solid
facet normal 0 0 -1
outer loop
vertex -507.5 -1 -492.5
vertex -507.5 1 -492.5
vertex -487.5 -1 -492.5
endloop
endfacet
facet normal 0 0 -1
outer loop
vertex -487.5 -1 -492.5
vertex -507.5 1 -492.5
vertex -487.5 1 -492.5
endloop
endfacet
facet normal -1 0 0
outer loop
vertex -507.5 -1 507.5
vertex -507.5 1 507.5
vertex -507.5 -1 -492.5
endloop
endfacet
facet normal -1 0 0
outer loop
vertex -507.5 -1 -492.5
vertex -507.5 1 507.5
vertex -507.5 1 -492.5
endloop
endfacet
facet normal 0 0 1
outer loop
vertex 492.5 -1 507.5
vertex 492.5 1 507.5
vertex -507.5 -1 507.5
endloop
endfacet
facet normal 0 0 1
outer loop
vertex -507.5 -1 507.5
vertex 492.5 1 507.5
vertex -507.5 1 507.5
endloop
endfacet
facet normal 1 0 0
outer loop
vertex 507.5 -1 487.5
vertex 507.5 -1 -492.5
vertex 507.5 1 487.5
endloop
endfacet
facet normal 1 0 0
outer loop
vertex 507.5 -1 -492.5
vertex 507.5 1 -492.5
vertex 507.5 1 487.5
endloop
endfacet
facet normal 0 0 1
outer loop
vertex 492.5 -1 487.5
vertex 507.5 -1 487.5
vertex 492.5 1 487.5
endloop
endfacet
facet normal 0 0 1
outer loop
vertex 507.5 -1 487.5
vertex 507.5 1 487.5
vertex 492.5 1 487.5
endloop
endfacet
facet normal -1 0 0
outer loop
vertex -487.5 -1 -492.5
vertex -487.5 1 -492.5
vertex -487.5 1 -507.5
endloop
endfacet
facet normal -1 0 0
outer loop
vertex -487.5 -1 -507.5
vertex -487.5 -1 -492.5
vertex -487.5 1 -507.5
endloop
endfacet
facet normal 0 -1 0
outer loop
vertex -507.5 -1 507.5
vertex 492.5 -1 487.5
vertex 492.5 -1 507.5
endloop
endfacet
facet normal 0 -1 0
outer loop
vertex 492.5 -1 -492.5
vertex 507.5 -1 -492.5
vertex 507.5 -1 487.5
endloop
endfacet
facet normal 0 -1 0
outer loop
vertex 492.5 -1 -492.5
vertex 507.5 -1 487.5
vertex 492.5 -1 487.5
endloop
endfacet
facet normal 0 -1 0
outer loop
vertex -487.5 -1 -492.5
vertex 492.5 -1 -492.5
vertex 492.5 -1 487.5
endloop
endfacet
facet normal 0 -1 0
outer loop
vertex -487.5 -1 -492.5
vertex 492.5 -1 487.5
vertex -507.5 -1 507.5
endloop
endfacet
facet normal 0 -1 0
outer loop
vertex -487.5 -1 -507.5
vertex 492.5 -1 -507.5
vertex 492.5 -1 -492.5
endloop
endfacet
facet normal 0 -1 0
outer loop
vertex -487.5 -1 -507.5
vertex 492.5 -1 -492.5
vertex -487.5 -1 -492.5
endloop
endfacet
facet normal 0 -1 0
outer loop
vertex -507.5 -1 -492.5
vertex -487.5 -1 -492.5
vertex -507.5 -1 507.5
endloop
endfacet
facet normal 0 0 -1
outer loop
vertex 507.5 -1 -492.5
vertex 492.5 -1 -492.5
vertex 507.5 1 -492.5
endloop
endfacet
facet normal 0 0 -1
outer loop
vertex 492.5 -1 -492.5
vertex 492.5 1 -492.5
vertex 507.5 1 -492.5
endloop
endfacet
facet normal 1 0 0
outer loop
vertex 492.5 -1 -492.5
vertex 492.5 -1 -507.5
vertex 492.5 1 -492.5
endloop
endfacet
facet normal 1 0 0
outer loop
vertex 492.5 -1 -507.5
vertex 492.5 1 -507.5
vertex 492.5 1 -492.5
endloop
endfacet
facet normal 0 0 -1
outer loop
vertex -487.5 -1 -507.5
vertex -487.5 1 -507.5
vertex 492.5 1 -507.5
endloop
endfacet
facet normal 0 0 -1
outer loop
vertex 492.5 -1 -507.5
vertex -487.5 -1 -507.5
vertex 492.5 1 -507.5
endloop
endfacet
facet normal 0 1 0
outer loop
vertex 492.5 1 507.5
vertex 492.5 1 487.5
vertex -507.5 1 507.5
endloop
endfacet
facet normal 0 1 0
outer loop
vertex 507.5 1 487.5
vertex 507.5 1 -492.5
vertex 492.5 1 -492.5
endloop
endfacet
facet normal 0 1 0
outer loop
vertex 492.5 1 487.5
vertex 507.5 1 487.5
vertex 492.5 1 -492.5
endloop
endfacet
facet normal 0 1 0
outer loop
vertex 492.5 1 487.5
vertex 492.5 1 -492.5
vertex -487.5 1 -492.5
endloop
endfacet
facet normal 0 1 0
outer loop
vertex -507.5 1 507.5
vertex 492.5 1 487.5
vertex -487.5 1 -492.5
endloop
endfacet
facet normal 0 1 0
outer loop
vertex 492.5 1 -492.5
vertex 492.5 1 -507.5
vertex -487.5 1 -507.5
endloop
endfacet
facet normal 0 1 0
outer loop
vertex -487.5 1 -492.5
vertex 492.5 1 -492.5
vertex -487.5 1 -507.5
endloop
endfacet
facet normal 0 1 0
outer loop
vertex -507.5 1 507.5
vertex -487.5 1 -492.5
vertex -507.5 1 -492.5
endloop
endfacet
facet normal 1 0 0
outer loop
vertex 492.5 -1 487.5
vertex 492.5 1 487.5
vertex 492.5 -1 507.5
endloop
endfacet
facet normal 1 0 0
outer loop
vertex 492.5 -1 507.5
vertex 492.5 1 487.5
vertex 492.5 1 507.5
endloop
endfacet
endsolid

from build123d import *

# Parameters (mm, degrees)
RESSALTO_EXTRUS_O1_DEPTH = 1


with BuildPart() as part:
    # Esboço1 → Ressalto-extrusão1 (new body, symmetric)
    with BuildSketch(Plane(origin=(0, 0, 0), x_dir=(1, 0, 0), z_dir=(0, 1, 0))):
        Polygon((-487.5, 507.5), (492.5, 507.5), (492.5, 492.5), (507.5, 492.5), (507.5, -487.5), (492.5, -487.5), (492.5, -507.5), (-507.5, -507.5), (-507.5, 492.5), (-487.5, 492.5), align=None)
    extrude(amount=RESSALTO_EXTRUS_O1_DEPTH, both=True)


solid = part.part
